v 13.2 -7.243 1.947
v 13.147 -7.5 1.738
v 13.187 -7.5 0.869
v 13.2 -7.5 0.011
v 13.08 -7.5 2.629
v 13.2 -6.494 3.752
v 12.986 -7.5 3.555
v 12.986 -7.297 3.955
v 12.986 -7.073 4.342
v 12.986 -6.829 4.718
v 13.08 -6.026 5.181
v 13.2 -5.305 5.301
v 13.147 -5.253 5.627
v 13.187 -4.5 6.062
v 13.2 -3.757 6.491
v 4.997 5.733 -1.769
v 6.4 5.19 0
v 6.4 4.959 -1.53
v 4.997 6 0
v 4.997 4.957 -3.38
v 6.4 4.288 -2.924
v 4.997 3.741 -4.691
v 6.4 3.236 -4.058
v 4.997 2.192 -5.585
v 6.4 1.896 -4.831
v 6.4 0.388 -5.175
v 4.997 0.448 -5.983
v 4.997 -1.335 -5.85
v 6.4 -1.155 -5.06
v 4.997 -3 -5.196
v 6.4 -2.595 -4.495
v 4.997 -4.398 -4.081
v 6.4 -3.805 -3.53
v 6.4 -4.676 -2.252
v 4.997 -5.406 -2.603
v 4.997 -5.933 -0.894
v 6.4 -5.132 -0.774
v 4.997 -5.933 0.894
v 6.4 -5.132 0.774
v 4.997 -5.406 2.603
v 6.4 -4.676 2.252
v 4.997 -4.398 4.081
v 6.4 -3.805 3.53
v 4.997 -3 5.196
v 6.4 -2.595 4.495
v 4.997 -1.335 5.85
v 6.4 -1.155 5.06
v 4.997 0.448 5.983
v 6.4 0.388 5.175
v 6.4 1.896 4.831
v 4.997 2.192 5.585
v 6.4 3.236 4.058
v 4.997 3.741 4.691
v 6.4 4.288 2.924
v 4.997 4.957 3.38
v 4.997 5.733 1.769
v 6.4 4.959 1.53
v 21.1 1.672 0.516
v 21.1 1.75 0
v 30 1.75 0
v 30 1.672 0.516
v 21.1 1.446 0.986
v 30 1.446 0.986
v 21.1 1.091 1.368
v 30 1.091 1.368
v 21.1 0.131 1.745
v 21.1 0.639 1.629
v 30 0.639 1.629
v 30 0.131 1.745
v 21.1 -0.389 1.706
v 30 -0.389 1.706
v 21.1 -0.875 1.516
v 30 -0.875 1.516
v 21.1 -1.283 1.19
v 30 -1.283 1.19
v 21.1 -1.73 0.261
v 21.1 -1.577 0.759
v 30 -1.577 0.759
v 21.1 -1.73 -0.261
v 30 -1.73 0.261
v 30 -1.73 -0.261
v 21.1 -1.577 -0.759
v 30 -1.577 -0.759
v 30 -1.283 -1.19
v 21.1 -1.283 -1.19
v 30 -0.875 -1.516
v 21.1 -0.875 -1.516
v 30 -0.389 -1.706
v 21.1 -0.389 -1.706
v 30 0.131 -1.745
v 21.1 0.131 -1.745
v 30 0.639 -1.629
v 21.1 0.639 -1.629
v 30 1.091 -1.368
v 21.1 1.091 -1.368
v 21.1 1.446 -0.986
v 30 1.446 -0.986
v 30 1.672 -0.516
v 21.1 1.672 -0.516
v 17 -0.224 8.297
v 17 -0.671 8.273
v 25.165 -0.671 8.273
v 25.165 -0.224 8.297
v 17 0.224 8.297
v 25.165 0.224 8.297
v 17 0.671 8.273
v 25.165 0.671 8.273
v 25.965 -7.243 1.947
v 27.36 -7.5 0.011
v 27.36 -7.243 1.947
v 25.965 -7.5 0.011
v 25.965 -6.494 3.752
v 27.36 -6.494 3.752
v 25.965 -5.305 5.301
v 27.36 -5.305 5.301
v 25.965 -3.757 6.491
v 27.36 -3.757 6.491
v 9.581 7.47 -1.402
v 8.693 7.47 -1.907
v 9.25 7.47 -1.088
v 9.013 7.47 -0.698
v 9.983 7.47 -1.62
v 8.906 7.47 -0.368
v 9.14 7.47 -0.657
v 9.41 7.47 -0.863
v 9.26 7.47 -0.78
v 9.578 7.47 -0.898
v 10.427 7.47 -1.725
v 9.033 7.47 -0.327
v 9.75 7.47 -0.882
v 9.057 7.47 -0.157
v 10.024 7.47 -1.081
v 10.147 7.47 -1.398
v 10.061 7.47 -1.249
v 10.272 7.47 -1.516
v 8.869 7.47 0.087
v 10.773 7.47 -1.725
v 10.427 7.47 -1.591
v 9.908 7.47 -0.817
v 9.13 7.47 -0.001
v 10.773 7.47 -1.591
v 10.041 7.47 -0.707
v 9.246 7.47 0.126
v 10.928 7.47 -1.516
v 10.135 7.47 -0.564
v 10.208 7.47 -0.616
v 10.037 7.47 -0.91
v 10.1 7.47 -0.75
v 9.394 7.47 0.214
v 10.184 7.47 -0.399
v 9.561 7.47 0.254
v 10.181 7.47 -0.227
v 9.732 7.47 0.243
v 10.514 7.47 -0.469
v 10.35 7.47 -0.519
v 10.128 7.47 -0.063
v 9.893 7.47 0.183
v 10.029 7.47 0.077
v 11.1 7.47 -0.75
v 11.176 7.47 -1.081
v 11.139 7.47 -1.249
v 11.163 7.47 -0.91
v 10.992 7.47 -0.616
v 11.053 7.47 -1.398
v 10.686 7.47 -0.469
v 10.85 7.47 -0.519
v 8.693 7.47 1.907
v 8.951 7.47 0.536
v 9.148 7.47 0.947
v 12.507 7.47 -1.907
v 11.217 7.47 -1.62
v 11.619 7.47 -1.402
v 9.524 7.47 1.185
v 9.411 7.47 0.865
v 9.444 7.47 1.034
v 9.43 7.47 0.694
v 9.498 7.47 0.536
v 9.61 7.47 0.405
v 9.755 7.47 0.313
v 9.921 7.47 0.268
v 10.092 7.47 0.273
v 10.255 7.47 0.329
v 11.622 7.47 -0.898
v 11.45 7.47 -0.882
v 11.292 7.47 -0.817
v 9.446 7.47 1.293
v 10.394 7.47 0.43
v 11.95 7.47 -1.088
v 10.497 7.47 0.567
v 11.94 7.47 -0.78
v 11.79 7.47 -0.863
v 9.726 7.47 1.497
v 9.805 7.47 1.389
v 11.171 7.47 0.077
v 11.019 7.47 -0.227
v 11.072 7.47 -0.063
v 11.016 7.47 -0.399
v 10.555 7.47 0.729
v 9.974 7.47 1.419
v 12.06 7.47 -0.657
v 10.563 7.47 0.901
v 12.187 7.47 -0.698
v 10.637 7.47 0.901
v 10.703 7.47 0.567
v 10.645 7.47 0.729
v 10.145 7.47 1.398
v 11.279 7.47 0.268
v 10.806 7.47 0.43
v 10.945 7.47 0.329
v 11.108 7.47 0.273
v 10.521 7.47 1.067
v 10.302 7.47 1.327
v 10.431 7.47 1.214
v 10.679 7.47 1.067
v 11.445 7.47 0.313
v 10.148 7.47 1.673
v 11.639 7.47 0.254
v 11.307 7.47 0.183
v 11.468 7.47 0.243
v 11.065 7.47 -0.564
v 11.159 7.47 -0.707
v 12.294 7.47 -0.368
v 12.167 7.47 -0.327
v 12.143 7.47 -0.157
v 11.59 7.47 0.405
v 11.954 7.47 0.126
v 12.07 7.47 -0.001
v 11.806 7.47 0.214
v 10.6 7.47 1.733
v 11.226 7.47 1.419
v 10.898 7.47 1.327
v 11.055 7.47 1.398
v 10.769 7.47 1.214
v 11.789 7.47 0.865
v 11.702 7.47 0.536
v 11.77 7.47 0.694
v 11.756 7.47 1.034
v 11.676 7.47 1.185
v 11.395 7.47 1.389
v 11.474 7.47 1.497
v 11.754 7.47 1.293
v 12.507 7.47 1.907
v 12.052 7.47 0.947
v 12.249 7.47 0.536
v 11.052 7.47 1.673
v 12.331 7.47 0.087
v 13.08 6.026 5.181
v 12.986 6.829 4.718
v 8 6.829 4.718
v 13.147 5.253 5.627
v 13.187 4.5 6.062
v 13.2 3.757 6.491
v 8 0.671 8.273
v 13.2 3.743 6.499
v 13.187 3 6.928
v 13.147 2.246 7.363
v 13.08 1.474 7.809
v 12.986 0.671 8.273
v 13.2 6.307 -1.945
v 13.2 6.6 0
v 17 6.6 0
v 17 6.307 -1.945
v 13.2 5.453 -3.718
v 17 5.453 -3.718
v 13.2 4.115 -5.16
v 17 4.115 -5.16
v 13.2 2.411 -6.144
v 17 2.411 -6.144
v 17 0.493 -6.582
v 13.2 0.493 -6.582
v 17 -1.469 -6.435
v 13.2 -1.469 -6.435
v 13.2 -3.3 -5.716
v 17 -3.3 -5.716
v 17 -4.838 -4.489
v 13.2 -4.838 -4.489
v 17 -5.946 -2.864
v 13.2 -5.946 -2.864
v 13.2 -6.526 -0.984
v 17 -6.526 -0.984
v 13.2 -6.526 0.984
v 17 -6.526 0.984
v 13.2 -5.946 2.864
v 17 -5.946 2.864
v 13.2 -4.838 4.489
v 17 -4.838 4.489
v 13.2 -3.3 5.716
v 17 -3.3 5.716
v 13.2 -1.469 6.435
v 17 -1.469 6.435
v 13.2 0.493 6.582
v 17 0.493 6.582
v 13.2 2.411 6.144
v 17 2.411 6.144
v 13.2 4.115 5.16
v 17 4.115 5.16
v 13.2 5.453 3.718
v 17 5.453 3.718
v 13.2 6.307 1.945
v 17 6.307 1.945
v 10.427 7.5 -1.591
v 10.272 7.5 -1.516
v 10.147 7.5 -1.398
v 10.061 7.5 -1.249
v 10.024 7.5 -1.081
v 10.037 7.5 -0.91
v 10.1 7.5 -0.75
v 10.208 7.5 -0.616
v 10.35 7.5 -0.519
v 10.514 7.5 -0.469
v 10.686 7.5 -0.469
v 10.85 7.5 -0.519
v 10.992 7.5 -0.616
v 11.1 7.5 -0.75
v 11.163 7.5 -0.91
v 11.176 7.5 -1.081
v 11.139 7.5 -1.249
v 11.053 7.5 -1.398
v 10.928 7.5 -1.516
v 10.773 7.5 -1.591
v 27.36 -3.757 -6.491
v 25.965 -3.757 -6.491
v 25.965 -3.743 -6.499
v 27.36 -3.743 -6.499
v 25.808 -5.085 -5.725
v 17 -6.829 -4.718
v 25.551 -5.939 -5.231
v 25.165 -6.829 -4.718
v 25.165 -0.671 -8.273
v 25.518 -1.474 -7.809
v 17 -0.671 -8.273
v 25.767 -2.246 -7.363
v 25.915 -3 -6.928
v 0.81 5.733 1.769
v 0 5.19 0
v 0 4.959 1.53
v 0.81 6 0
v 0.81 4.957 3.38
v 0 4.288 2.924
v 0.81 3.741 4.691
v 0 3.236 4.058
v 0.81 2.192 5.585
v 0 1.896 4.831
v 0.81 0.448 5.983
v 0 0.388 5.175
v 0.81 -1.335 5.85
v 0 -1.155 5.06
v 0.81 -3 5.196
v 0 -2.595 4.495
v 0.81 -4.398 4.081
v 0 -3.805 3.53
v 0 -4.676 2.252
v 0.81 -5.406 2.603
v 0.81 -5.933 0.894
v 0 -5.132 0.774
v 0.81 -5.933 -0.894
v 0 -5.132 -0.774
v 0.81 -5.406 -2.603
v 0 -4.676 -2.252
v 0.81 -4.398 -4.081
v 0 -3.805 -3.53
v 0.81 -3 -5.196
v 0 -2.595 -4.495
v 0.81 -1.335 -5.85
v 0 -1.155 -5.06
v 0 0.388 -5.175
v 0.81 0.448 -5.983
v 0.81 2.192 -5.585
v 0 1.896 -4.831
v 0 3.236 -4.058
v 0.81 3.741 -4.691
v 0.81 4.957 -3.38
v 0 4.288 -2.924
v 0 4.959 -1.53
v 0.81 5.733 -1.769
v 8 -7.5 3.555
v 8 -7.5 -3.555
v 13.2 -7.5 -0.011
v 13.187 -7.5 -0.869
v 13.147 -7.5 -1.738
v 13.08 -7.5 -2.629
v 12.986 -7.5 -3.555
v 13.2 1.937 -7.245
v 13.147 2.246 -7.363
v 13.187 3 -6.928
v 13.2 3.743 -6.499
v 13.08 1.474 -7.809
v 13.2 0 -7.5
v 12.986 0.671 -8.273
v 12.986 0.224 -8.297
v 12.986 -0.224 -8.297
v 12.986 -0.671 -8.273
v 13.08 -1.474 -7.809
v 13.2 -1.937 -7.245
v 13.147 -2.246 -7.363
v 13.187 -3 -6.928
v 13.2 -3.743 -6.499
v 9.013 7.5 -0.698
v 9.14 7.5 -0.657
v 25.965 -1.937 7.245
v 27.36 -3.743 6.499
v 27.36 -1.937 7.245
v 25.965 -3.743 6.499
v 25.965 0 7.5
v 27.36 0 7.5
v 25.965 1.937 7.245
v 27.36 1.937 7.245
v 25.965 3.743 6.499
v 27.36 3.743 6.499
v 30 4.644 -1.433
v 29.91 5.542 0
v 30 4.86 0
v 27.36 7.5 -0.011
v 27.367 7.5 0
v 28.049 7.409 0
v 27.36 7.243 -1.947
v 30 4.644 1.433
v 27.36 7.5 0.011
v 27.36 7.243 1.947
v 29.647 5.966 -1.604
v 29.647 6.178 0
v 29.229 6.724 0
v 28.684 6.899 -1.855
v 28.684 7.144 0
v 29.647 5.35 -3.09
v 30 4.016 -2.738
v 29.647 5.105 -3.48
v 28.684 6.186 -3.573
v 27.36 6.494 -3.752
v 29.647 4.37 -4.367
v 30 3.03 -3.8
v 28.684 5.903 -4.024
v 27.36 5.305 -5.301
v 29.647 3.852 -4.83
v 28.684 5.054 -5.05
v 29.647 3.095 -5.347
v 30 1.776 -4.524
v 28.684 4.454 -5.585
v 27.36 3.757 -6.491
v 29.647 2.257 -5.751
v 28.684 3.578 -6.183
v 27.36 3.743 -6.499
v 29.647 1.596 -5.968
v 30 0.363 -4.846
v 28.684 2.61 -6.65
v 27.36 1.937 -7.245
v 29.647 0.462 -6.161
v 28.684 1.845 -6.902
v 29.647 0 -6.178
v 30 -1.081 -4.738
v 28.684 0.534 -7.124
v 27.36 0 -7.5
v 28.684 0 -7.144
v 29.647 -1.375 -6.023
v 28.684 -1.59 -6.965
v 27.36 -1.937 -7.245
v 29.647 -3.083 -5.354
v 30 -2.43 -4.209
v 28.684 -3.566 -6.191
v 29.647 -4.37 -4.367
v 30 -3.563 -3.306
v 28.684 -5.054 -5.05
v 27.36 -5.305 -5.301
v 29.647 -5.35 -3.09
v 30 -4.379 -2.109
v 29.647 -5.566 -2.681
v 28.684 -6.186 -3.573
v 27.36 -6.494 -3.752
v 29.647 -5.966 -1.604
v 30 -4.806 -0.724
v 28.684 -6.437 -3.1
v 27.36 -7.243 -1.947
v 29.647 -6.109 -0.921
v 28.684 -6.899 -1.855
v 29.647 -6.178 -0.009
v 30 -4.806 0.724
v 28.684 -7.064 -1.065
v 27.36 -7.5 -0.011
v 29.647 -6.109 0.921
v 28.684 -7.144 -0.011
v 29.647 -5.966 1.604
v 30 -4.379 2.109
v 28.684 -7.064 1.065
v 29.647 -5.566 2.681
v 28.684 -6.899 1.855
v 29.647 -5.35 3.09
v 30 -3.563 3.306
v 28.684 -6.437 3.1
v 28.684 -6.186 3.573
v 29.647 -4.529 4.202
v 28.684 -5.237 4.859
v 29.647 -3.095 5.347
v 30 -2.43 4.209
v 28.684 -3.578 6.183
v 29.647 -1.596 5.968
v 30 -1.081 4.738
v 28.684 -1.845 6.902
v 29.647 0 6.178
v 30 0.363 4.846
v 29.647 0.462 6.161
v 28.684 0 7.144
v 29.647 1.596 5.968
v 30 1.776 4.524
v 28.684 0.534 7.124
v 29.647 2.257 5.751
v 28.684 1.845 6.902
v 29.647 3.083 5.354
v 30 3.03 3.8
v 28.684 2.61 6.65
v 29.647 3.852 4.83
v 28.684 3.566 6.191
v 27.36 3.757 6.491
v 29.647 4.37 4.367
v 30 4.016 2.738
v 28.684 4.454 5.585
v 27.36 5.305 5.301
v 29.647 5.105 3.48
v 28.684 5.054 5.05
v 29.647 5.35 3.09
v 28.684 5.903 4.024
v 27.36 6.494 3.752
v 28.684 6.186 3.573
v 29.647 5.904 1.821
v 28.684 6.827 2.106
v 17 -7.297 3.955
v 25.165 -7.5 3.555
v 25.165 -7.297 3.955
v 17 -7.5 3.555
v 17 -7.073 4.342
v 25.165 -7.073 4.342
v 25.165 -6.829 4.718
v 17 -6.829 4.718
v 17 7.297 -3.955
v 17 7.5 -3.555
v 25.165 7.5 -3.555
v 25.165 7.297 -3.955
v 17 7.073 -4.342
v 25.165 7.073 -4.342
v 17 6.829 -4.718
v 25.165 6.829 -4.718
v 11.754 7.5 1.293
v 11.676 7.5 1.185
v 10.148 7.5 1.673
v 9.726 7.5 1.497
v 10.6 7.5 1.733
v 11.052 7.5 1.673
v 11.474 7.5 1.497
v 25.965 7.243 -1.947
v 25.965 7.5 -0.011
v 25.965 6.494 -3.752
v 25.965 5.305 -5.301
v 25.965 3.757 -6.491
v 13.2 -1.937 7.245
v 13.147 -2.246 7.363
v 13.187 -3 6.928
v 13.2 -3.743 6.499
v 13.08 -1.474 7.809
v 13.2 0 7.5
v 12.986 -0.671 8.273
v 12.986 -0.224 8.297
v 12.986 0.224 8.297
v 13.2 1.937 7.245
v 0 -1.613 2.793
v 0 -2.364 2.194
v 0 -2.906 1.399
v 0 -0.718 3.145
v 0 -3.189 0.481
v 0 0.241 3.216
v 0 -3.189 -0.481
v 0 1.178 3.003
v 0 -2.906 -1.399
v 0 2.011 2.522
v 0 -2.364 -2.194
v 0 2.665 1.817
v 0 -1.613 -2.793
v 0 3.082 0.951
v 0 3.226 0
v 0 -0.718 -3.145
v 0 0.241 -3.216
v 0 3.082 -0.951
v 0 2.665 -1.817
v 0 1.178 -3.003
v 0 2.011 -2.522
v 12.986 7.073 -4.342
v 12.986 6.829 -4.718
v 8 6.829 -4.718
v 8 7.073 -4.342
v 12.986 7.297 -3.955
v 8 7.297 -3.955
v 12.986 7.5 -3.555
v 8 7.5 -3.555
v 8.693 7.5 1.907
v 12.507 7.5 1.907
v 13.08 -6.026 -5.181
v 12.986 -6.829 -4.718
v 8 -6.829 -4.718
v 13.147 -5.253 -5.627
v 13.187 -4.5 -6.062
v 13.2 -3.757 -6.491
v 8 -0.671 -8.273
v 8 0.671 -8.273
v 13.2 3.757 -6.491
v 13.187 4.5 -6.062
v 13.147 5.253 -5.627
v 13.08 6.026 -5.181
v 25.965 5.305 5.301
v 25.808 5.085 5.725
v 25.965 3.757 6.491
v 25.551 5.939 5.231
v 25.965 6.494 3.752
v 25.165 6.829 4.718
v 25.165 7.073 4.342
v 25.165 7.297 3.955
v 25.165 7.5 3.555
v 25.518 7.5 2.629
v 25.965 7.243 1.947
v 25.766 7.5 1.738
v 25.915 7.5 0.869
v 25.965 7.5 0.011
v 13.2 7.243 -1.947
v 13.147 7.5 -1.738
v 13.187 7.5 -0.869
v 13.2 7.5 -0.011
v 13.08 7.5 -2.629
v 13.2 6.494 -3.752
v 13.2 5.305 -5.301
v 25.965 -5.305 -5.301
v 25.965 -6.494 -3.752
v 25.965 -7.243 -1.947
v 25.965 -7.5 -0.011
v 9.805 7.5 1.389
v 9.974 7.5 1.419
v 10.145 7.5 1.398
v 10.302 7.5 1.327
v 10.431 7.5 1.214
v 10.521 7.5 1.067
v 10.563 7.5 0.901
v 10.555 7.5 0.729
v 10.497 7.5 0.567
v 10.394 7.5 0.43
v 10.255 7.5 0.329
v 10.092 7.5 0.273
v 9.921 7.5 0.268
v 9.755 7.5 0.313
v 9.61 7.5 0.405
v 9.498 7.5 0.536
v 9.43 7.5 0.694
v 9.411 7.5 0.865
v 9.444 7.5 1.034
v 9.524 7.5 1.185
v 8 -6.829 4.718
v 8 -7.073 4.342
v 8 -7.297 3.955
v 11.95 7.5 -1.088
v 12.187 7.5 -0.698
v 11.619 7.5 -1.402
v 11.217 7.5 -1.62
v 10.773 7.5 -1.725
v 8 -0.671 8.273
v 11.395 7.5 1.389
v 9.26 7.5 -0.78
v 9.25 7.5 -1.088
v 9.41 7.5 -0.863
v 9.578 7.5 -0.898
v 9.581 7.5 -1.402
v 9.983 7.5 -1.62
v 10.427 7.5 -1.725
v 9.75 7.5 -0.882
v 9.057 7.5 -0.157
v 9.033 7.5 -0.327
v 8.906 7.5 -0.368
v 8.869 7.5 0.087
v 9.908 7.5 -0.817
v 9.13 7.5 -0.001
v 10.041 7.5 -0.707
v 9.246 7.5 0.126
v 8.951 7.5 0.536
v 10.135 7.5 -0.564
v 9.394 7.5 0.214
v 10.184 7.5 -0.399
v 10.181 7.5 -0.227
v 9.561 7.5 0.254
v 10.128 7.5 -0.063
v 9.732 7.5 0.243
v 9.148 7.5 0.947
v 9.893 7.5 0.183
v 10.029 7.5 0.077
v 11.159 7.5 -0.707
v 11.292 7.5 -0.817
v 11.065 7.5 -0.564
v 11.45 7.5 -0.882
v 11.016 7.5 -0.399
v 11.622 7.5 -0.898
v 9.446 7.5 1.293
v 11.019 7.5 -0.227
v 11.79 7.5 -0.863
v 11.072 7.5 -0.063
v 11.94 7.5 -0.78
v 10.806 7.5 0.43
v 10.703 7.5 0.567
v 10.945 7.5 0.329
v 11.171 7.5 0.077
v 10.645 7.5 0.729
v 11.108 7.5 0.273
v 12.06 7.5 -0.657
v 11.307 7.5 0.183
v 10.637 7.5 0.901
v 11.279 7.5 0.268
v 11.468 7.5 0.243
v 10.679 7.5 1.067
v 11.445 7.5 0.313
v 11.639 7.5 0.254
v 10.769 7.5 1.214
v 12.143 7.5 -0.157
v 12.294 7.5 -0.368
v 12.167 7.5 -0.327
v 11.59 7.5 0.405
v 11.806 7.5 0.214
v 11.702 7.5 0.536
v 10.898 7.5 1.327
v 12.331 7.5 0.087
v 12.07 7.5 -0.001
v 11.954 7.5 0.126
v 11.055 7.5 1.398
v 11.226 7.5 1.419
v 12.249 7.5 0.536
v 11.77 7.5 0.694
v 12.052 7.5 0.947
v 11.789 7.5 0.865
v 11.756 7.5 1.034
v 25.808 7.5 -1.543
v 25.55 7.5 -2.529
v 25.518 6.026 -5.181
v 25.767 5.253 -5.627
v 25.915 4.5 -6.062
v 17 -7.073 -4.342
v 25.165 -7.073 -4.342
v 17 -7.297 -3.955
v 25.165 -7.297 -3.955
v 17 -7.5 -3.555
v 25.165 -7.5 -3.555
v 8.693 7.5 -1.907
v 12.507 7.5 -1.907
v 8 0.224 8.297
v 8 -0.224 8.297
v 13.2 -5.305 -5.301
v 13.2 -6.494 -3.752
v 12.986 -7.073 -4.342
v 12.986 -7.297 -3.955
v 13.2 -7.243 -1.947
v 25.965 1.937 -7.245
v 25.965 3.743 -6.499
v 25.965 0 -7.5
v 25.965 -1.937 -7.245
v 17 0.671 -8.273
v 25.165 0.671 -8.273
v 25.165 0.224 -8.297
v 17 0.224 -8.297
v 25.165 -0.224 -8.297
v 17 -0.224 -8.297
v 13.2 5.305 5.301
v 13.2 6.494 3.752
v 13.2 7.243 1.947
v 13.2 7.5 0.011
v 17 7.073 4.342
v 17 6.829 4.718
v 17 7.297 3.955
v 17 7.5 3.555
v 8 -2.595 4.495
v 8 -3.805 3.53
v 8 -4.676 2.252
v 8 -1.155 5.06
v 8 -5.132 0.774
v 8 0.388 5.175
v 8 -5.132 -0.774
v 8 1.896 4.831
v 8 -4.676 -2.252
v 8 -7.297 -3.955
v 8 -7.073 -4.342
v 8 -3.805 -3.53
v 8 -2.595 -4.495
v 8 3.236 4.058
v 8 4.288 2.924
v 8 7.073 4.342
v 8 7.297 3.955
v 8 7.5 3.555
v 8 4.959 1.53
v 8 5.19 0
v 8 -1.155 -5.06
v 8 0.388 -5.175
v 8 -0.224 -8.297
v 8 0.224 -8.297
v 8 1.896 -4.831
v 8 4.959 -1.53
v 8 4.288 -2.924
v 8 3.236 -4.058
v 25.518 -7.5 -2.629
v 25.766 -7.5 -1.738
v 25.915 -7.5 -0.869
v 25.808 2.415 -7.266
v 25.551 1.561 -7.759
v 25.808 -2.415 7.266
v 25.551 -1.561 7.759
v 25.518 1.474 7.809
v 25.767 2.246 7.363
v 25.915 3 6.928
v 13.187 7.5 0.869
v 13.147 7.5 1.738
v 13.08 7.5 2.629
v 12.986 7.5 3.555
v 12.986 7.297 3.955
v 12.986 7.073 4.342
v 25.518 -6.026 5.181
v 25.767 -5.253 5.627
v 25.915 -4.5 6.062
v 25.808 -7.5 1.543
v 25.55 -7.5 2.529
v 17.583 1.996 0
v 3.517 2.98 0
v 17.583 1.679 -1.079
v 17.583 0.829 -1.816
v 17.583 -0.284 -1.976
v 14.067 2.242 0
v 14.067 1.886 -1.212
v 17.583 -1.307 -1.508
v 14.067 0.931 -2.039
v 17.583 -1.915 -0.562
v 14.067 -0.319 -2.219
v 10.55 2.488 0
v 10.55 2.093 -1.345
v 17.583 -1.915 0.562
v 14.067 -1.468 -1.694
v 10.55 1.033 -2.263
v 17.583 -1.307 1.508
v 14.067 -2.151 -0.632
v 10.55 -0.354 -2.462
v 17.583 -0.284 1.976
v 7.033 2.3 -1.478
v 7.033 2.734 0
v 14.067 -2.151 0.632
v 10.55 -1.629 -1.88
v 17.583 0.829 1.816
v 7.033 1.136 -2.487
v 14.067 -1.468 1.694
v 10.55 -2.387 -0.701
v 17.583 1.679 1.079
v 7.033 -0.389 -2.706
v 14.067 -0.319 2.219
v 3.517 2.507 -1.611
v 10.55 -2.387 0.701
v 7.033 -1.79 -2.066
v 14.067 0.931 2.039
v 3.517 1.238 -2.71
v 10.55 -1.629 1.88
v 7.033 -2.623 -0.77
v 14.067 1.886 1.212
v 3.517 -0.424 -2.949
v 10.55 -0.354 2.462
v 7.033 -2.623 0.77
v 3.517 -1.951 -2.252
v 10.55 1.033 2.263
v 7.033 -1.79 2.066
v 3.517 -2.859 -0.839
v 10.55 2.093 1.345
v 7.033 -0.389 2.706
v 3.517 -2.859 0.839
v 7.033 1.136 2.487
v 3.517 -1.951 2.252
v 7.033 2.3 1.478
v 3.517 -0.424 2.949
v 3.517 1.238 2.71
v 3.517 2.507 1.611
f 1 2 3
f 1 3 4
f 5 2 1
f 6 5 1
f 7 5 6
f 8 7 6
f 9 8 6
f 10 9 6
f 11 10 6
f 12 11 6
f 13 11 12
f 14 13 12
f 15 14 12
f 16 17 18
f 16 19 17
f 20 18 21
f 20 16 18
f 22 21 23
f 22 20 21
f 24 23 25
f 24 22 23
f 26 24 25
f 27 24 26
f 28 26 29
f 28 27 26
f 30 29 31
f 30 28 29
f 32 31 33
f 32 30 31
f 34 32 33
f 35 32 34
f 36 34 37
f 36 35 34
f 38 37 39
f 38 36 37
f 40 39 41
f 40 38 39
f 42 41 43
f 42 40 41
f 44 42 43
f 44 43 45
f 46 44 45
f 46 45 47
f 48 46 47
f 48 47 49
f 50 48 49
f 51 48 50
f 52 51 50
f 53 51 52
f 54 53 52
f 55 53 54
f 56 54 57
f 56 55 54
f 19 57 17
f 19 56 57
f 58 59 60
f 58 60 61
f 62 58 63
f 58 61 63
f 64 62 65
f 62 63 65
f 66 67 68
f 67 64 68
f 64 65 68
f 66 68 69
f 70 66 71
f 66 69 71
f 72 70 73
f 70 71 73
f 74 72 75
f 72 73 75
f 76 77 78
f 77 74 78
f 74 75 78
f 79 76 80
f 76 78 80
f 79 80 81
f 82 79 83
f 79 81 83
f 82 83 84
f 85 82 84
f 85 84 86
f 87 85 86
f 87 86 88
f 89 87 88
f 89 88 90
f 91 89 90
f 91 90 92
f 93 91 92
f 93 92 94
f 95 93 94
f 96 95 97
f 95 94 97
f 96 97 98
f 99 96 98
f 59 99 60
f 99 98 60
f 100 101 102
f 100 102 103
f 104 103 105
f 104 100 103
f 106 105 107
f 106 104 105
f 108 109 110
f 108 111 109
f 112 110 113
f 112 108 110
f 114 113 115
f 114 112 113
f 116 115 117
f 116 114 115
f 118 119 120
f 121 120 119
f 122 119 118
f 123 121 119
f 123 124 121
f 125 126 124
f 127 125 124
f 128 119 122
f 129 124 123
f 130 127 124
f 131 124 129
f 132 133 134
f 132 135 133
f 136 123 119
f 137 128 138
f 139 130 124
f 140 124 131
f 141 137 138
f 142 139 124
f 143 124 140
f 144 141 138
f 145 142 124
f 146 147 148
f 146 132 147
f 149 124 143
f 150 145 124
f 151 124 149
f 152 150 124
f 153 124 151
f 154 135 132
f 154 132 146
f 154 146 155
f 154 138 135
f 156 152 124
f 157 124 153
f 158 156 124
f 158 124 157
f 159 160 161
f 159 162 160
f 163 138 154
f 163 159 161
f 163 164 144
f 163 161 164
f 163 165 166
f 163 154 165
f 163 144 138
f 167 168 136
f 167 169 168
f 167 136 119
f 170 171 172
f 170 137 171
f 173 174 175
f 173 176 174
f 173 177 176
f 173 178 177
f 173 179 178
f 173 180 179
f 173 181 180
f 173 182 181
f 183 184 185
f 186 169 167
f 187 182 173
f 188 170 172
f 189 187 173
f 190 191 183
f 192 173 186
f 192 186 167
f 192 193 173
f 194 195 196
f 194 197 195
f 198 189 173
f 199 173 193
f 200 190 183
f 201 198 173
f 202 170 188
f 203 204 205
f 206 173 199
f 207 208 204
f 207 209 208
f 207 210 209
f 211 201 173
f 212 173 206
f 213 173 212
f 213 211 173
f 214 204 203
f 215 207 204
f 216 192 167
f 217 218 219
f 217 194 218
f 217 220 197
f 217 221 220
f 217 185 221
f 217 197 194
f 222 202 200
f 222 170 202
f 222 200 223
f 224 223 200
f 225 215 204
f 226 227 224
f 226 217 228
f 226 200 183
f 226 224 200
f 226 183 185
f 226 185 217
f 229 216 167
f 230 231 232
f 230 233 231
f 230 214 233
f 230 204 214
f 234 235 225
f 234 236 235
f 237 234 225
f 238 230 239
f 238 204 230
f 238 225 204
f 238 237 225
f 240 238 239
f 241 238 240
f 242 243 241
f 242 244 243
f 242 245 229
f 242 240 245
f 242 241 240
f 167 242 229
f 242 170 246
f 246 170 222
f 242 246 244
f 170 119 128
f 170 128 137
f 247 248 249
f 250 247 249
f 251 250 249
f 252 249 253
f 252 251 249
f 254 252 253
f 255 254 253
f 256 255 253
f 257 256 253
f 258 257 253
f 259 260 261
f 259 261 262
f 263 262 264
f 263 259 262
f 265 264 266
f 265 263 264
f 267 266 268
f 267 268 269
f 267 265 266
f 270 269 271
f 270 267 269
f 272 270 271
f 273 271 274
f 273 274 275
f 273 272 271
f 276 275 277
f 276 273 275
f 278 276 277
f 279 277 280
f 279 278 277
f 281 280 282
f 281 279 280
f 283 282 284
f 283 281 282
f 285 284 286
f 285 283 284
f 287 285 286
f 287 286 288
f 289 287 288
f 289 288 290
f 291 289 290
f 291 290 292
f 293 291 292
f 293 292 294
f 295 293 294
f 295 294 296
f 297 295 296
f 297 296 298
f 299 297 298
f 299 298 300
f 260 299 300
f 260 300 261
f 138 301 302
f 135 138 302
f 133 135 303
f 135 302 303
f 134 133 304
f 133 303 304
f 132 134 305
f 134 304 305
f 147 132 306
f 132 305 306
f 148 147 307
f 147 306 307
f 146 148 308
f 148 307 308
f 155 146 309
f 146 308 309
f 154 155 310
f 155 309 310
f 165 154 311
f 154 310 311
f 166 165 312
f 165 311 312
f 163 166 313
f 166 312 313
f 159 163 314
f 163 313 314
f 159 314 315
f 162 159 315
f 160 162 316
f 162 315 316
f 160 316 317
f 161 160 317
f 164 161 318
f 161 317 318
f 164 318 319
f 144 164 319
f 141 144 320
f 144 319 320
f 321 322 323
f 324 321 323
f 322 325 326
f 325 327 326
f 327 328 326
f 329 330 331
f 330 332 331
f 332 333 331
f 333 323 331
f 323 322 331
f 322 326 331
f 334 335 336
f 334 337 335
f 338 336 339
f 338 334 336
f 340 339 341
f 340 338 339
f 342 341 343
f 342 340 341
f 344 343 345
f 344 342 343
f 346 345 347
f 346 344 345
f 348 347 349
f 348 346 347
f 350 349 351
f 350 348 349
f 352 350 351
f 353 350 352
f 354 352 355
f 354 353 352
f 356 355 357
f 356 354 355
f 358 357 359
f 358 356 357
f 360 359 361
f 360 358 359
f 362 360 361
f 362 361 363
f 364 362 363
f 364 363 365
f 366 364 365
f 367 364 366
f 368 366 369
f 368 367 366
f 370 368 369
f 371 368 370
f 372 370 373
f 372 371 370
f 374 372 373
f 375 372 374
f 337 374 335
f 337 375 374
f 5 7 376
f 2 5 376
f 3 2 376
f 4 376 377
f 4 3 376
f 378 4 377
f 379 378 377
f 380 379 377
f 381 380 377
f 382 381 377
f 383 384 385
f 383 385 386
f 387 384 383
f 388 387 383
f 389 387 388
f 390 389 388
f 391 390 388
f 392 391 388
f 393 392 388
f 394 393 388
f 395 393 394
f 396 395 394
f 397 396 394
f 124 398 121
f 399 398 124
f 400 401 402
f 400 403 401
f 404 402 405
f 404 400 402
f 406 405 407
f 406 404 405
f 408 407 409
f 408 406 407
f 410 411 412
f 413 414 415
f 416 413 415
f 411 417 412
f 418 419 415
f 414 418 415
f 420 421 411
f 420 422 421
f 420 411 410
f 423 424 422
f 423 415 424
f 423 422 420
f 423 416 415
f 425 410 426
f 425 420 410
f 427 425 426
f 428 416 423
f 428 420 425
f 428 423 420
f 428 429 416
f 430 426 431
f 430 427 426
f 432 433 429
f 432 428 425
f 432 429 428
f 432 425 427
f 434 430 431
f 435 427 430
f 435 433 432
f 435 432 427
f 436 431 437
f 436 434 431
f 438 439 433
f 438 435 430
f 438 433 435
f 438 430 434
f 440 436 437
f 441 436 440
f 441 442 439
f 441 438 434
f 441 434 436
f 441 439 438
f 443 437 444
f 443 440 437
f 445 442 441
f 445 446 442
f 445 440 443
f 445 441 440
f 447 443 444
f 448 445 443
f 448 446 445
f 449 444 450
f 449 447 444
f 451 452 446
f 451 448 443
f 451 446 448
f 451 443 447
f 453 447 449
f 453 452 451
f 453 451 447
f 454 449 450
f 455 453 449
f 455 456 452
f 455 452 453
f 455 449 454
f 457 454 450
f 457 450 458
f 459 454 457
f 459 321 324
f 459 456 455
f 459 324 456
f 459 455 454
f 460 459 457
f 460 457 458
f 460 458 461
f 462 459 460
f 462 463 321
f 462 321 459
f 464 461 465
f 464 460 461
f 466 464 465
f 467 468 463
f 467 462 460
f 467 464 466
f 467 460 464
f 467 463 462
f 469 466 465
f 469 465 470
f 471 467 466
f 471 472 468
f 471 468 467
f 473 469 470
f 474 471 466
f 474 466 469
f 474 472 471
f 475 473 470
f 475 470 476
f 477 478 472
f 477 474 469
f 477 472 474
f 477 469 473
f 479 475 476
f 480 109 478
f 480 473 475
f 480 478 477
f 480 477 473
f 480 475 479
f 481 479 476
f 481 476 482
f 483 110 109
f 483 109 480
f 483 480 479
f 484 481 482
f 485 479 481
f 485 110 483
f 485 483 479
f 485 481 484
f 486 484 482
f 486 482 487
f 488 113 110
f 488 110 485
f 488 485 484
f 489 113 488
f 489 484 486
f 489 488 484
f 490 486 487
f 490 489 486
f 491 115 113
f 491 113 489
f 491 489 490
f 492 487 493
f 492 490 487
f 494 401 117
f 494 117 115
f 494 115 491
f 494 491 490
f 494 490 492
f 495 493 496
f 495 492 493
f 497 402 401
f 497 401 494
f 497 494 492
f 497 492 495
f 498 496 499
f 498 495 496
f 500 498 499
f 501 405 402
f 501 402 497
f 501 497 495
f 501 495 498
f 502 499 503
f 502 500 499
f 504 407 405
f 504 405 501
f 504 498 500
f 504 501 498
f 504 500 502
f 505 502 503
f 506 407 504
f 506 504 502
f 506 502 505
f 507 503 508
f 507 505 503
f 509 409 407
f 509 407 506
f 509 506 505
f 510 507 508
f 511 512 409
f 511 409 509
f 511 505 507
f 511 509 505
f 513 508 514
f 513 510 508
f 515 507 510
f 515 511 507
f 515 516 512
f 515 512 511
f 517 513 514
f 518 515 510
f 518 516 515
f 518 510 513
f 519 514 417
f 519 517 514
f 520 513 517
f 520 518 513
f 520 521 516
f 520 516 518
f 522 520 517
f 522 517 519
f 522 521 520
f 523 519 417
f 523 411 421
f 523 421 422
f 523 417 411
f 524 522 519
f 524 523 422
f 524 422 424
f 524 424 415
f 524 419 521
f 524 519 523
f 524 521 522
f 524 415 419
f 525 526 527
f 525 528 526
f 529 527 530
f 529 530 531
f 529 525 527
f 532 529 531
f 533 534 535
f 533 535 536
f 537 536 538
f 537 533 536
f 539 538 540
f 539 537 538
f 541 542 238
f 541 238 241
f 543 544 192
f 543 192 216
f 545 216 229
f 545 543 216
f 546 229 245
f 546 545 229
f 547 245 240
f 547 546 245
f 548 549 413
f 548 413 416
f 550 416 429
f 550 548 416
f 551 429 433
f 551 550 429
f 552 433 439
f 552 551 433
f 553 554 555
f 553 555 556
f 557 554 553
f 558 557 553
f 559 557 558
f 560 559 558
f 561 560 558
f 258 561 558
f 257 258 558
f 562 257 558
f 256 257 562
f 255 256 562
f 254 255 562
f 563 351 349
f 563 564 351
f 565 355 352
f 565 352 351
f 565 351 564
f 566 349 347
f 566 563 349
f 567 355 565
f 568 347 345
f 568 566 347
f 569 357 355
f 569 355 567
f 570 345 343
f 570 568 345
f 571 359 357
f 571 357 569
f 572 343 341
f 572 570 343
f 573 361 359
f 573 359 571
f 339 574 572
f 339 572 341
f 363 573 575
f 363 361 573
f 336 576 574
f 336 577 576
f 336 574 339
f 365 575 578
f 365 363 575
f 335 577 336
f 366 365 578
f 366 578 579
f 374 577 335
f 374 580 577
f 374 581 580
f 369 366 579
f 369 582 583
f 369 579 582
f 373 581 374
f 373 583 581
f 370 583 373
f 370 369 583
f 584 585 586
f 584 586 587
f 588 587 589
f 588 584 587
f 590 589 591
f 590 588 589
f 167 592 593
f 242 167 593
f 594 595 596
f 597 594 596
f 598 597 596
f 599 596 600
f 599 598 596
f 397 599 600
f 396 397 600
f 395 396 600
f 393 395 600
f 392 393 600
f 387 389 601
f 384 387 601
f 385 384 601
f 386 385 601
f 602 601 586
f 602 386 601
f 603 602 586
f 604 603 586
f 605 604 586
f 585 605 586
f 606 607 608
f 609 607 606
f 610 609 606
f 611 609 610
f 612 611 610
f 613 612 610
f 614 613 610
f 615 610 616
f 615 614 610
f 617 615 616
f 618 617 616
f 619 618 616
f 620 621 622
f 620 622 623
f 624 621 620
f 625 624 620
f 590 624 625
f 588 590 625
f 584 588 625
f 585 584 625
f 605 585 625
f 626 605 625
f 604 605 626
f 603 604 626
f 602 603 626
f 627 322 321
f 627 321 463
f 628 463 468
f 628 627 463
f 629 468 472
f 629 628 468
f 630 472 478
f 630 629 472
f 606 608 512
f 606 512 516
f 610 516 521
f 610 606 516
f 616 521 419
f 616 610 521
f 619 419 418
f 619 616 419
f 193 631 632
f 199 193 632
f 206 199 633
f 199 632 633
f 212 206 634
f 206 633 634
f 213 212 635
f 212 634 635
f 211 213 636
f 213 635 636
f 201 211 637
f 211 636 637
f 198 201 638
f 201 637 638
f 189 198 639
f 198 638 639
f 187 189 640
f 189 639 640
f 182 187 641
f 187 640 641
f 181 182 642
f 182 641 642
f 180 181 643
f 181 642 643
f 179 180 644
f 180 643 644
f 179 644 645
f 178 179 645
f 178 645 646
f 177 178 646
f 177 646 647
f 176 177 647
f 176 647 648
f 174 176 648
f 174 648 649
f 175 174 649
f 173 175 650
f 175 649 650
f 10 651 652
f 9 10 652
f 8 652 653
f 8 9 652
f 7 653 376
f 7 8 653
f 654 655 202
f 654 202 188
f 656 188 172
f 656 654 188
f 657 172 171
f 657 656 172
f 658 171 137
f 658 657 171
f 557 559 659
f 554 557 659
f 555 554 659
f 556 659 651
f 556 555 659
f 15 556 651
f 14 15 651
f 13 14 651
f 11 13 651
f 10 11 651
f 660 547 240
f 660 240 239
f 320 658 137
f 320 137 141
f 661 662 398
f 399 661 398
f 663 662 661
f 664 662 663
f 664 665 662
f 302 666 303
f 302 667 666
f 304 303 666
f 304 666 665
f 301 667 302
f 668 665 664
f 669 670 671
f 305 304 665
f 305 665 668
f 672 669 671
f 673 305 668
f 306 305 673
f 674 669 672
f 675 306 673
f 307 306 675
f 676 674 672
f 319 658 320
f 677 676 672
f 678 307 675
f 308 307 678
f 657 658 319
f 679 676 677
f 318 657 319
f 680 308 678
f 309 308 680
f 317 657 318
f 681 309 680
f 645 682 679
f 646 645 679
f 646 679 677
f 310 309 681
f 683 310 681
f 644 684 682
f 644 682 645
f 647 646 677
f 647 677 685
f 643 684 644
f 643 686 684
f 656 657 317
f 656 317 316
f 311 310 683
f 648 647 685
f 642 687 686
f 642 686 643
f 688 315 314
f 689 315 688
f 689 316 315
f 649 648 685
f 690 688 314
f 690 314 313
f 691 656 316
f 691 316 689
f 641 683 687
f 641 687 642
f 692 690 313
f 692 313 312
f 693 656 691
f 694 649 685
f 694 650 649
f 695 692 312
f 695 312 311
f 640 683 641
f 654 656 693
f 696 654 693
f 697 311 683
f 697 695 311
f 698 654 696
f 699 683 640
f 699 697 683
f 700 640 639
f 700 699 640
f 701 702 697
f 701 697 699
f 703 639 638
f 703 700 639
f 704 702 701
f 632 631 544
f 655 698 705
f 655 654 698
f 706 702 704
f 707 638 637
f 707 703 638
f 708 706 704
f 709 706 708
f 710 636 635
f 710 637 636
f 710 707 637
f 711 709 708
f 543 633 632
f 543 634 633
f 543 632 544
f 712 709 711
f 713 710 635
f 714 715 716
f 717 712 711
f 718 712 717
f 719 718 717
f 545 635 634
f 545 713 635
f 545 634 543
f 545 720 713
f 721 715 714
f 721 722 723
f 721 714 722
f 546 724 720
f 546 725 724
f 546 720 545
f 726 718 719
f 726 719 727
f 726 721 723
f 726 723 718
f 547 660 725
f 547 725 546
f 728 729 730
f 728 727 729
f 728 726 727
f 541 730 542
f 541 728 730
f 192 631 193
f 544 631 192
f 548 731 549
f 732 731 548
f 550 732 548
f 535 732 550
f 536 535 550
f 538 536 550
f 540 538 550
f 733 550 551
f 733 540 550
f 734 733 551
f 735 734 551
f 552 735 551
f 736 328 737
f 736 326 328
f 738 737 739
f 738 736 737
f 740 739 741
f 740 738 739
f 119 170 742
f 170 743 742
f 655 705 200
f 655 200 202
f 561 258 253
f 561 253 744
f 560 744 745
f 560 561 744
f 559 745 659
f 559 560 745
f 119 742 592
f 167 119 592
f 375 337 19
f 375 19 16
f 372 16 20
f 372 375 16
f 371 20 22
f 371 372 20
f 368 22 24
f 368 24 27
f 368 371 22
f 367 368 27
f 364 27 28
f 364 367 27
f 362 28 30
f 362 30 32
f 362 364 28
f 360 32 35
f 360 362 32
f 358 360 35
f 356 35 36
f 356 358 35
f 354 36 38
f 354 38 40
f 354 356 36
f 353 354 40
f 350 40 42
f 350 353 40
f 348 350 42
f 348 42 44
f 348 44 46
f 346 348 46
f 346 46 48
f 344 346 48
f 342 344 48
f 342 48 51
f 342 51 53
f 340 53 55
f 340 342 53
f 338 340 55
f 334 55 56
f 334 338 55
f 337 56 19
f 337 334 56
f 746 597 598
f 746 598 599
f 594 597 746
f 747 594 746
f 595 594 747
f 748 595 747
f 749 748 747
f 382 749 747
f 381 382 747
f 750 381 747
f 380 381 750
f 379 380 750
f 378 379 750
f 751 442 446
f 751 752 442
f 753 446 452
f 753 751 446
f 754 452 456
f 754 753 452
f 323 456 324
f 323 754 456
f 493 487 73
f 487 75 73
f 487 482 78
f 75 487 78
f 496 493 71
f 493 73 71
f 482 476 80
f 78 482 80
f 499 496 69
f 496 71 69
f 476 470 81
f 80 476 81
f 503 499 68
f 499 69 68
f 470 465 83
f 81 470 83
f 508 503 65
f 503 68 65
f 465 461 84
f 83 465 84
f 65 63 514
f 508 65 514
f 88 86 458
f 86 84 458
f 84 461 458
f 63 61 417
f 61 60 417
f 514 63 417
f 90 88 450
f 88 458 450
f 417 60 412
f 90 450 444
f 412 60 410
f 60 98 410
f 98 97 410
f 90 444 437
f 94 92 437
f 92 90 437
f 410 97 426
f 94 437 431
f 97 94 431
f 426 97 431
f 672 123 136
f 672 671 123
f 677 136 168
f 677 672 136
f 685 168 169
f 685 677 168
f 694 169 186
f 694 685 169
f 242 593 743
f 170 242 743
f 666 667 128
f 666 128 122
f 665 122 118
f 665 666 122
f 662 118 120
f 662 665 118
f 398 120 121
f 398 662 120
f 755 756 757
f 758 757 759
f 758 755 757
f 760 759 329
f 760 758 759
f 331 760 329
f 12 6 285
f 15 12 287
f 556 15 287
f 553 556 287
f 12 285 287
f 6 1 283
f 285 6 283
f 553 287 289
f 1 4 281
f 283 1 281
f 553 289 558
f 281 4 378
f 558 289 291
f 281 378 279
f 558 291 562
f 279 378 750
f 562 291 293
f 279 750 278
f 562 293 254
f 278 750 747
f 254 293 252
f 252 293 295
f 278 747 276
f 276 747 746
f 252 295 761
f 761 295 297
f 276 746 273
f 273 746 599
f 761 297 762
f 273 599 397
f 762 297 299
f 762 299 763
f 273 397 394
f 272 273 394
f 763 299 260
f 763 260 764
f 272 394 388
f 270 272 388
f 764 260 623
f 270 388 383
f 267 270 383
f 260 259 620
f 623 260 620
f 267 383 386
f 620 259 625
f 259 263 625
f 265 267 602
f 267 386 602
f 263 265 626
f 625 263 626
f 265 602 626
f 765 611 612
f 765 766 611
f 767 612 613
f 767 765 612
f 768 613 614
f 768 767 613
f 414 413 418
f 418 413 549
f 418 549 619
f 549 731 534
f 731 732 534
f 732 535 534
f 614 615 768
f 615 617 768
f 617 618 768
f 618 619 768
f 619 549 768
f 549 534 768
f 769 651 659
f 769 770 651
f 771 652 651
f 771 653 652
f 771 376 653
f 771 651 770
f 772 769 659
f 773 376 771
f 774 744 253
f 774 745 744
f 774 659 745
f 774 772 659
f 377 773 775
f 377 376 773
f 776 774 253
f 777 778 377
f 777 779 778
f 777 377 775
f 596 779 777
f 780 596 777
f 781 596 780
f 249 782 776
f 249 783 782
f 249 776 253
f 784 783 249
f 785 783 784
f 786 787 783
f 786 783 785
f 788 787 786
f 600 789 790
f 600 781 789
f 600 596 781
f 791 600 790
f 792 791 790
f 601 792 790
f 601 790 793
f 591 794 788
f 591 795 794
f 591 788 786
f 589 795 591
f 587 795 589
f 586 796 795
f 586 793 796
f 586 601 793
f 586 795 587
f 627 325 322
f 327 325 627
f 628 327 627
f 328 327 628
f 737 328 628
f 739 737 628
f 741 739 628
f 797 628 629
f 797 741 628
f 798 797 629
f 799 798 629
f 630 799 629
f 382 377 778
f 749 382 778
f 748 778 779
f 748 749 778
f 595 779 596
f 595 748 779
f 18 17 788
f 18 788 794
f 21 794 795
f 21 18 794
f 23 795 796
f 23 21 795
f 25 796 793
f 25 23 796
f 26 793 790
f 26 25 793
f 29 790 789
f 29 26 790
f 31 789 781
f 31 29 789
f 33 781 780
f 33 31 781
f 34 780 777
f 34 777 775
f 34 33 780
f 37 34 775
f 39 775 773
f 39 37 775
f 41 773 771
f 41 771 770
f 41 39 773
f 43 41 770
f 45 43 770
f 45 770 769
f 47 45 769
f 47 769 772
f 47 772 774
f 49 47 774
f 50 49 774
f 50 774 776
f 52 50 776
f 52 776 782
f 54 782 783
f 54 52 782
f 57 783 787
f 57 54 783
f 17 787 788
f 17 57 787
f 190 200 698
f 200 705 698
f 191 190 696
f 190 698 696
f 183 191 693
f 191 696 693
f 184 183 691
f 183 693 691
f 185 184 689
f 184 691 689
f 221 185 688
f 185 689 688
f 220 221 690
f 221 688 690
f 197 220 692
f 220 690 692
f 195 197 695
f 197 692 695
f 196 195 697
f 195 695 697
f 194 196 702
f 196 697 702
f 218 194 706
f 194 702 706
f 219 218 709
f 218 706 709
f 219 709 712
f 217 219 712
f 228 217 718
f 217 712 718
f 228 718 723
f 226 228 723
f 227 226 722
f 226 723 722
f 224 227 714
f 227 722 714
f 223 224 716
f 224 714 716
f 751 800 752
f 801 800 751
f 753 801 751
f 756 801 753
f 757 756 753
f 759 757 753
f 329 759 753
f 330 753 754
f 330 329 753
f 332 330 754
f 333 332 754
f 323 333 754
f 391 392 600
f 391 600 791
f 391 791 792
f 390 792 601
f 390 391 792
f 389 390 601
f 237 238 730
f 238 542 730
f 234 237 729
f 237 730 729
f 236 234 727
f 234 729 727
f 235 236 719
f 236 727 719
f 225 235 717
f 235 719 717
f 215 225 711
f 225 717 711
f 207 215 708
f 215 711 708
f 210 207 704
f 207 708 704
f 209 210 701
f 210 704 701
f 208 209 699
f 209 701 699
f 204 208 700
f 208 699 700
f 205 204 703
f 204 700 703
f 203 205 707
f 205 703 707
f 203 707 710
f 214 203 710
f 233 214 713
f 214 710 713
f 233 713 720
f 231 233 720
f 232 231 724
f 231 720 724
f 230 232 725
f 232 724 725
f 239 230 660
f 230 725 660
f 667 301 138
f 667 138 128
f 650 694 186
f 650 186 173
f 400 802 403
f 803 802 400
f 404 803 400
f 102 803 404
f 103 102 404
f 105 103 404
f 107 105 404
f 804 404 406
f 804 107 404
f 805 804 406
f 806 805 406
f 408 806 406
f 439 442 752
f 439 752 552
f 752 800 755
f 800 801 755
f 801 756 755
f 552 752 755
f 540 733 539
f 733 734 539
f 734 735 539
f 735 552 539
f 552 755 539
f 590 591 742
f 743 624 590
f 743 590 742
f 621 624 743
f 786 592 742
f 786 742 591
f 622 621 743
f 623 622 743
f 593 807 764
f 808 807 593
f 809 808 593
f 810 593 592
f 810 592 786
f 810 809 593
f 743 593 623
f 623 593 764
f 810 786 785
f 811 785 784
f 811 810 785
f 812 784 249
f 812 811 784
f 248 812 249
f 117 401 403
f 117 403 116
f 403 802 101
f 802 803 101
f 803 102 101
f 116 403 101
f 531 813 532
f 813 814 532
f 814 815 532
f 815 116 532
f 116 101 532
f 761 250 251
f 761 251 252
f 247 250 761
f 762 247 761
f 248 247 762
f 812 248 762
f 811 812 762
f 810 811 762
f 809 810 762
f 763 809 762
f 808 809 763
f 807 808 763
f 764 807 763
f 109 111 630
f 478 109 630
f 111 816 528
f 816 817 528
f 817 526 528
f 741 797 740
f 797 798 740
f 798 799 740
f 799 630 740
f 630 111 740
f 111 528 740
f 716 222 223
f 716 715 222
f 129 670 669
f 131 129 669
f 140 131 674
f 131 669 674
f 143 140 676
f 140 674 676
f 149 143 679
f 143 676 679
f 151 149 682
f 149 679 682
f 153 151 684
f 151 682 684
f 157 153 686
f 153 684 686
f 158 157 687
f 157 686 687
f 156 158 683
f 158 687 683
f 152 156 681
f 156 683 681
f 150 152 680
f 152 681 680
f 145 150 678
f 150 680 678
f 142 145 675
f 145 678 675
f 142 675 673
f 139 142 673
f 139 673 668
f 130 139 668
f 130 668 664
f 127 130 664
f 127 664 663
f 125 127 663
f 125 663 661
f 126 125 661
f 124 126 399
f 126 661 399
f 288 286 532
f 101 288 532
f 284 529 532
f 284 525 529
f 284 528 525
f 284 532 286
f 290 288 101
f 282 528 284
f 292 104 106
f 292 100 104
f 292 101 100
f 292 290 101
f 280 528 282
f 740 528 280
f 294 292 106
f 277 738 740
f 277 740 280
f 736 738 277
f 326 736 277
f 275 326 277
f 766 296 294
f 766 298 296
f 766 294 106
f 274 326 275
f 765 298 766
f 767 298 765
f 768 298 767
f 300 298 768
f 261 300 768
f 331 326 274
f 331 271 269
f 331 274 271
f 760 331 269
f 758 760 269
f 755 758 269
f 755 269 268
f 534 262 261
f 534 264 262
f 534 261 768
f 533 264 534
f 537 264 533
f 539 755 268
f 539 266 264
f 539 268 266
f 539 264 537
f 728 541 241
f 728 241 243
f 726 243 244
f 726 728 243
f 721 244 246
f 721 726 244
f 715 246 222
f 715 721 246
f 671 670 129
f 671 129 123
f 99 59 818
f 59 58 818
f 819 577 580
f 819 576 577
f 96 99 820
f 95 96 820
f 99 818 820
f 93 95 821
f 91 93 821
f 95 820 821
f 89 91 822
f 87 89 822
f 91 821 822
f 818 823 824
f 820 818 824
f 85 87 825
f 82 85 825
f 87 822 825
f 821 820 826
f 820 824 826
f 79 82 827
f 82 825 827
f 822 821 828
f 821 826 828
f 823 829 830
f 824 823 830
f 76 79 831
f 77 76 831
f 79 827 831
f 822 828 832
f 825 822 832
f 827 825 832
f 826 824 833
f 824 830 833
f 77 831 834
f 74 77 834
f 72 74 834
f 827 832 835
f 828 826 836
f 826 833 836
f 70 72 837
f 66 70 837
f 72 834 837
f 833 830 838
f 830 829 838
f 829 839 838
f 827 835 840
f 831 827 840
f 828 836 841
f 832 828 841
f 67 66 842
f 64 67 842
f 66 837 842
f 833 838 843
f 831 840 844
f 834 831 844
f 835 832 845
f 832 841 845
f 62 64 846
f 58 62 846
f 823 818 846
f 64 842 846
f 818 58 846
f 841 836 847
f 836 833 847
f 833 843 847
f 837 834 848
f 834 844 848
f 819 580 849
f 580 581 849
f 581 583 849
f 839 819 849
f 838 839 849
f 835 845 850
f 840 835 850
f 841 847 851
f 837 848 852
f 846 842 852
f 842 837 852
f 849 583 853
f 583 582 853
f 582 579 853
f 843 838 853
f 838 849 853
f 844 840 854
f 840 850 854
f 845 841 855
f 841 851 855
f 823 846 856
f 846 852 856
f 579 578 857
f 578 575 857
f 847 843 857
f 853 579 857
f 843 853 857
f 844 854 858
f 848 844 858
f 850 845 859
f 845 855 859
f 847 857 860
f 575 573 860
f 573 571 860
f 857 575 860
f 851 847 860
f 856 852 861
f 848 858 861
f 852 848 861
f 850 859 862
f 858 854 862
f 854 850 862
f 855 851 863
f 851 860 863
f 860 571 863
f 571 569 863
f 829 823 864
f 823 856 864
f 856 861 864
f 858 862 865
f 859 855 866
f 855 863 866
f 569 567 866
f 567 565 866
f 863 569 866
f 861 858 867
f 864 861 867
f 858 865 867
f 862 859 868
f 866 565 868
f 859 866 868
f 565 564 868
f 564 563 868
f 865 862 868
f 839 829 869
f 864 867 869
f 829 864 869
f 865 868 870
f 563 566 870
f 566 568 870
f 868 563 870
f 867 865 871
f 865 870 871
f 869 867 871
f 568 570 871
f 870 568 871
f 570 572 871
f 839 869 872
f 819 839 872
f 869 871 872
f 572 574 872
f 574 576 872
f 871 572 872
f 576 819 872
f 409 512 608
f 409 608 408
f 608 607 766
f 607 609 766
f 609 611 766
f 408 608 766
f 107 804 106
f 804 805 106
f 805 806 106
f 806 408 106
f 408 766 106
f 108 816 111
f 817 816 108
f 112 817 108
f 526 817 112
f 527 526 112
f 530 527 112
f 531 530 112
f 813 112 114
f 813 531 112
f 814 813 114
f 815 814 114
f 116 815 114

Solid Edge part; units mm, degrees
sketch "Sketch1" plane through (0, 0, 0) normal (0, 0, 1) x (1, 0, 0)
  line L0 (0, 5.19) -> (0, 3.2255)
  line L1 (0, 3.2255) -> (21.1, 1.75)
  line L2 (21.1, 1.75) -> (30, 1.75)
  line L3 (30, 1.75) -> (30, 4.86)
  arc A0 (30, 4.86) -> (27.36, 7.5) centre (27.36, 4.86) ccw
  line L4 (27.36, 7.5) -> (25.9651, 7.5)
  line L5 (25.9651, 7.5) -> (22.15, 11.3151)
  line L6 (22.15, 11.3151) -> (17, 11.3151)
  line L7 (17, 11.3151) -> (17, 6.6)
  line L8 (17, 6.6) -> (13.2, 6.6)
  line L9 (13.2, 6.6) -> (13.2, 7.5)
  line L10 (13.2, 7.5) -> (12.5301, 10)
  line L11 (12.5301, 10) -> (8, 10)
  line L12 (8, 10) -> (8, 5.19)
  line L13 (8, 5.19) -> (6.4, 5.19)
  line L14 (6.4, 5.19) -> (4.997, 6)
  line L15 (4.997, 6) -> (0.81, 6)
  line L16 (0.81, 6) -> (0, 5.19)
revolve "RevolvedProtrusion1" add sketch "Sketch1" angle 360 about axis through (30, 0, 0) along (-1, 0, 0)
sketch "Sketch2" plane through (13.2, 0, 0) normal (1, 0, 0) x (0, 1, 0)
  line L0 (15, 15) -> (-15, 15)
  line L1 (-15, 15) -> (-15, -15)
  line L2 (-15, -15) -> (15, -15)
  line L3 (15, -15) -> (15, 15)
  arc A0 (0.671, 8.2728) -> (-0.671, 8.2728) centre (0, 0) ccw
  line L4 (-0.671, 8.2728) -> (-6.829, 4.7176)
  arc A1 (-6.829, 4.7176) -> (-7.5, 3.5553) centre (0, 0) ccw
  line L5 (-7.5, 3.5553) -> (-7.5, -3.5553)
  arc A2 (-7.5, -3.5553) -> (-6.829, -4.7176) centre (0, 0) ccw
  line L6 (-6.829, -4.7176) -> (-0.671, -8.2728)
  arc A3 (-0.671, -8.2728) -> (0.671, -8.2728) centre (0, 0) ccw
  line L7 (0.671, -8.2728) -> (6.829, -4.7176)
  arc A4 (6.829, -4.7176) -> (7.5, -3.5553) centre (0, 0) ccw
  line L8 (7.5, -3.5553) -> (7.5, 3.5553)
  arc A5 (7.5, 3.5553) -> (6.829, 4.7176) centre (0, 0) ccw
  line L9 (6.829, 4.7176) -> (0.671, 8.2728)
extrude "ExtrudedCutout_1" cut sketch "Sketch2" against normal blind 5.2
sketch "Sketch3" plane through (17, 0, 0) normal (1, 0, 0) x (0, 1, 0)
  line L0 (15, 15) -> (-15, 15)
  line L1 (-15, 15) -> (-15, -15)
  line L2 (-15, -15) -> (15, -15)
  line L3 (15, -15) -> (15, 15)
  arc A0 (0.671, 8.2728) -> (-0.671, 8.2728) centre (0, 0) ccw
  line L4 (-0.671, 8.2728) -> (-6.829, 4.7176)
  arc A1 (-6.829, 4.7176) -> (-7.5, 3.5553) centre (0, 0) ccw
  line L5 (-7.5, 3.5553) -> (-7.5, -3.5553)
  arc A2 (-7.5, -3.5553) -> (-6.829, -4.7176) centre (0, 0) ccw
  line L6 (-6.829, -4.7176) -> (-0.671, -8.2728)
  arc A3 (-0.671, -8.2728) -> (0.671, -8.2728) centre (0, 0) ccw
  line L7 (0.671, -8.2728) -> (6.829, -4.7176)
  arc A4 (6.829, -4.7176) -> (7.5, -3.5553) centre (0, 0) ccw
  line L8 (7.5, -3.5553) -> (7.5, 3.5553)
  arc A5 (7.5, 3.5553) -> (6.829, 4.7176) centre (0, 0) ccw
  line L9 (6.829, 4.7176) -> (0.671, 8.2728)
extrude "ExtrudedCutout_2" cut sketch "Sketch3" along normal blind 30
sketch "Sketch4" plane through (0, 7.5, 0) normal (0, -1, 0) x (1, 0, 0)
  line L0 (8.6933, -1.9067) -> (8.6933, 1.9067)
  line L1 (8.6933, 1.9067) -> (12.5067, 1.9067)
  line L2 (12.5067, 1.9067) -> (12.5067, -1.9067)
  line L3 (12.5067, -1.9067) -> (8.6933, -1.9067)
  arc A0 (8.9062, -0.3681) -> (9.446, 1.2934) centre (10.6, 0) cw
  line L4 (9.446, 1.2934) -> (9.5245, 1.1854)
  arc A1 (9.5245, 1.1854) -> (9.805, 1.3892) centre (9.9887, 0.8414) ccw
  line L5 (9.805, 1.3892) -> (9.7265, 1.4971)
  arc A2 (9.7265, 1.4971) -> (11.4735, 1.4971) centre (10.6, 0) cw
  line L6 (11.4735, 1.4971) -> (11.395, 1.3892)
  arc A3 (11.395, 1.3892) -> (11.6755, 1.1854) centre (11.2113, 0.8414) ccw
  line L7 (11.6755, 1.1854) -> (11.754, 1.2934)
  arc A4 (11.754, 1.2934) -> (12.2938, -0.3681) centre (10.6, 0) cw
  line L8 (12.2938, -0.3681) -> (12.1669, -0.3268)
  arc A5 (12.1669, -0.3268) -> (12.0597, -0.6565) centre (11.5891, -0.3214) ccw
  line L9 (12.0597, -0.6565) -> (12.1867, -0.6978)
  arc A6 (12.1867, -0.6978) -> (10.7733, -1.7246) centre (10.6, 0) cw
  line L10 (10.7733, -1.7246) -> (10.7733, -1.5912)
  arc A7 (10.7733, -1.5912) -> (10.4267, -1.5912) centre (10.6, -1.04) ccw
  line L11 (10.4267, -1.5912) -> (10.4267, -1.7246)
  arc A8 (10.4267, -1.7246) -> (9.0133, -0.6978) centre (10.6, 0) cw
  line L12 (9.0133, -0.6978) -> (9.1403, -0.6565)
  arc A9 (9.1403, -0.6565) -> (9.0331, -0.3268) centre (9.6109, -0.3214) ccw
  line L13 (9.0331, -0.3268) -> (8.9062, -0.3681)
extrude "ExtrudedCutout_3" cut sketch "Sketch4" along normal blind 0.03
properties part number "SKINTOP ST-M 12x1,5      Art. Nr. 53111000(F=3.5)"
